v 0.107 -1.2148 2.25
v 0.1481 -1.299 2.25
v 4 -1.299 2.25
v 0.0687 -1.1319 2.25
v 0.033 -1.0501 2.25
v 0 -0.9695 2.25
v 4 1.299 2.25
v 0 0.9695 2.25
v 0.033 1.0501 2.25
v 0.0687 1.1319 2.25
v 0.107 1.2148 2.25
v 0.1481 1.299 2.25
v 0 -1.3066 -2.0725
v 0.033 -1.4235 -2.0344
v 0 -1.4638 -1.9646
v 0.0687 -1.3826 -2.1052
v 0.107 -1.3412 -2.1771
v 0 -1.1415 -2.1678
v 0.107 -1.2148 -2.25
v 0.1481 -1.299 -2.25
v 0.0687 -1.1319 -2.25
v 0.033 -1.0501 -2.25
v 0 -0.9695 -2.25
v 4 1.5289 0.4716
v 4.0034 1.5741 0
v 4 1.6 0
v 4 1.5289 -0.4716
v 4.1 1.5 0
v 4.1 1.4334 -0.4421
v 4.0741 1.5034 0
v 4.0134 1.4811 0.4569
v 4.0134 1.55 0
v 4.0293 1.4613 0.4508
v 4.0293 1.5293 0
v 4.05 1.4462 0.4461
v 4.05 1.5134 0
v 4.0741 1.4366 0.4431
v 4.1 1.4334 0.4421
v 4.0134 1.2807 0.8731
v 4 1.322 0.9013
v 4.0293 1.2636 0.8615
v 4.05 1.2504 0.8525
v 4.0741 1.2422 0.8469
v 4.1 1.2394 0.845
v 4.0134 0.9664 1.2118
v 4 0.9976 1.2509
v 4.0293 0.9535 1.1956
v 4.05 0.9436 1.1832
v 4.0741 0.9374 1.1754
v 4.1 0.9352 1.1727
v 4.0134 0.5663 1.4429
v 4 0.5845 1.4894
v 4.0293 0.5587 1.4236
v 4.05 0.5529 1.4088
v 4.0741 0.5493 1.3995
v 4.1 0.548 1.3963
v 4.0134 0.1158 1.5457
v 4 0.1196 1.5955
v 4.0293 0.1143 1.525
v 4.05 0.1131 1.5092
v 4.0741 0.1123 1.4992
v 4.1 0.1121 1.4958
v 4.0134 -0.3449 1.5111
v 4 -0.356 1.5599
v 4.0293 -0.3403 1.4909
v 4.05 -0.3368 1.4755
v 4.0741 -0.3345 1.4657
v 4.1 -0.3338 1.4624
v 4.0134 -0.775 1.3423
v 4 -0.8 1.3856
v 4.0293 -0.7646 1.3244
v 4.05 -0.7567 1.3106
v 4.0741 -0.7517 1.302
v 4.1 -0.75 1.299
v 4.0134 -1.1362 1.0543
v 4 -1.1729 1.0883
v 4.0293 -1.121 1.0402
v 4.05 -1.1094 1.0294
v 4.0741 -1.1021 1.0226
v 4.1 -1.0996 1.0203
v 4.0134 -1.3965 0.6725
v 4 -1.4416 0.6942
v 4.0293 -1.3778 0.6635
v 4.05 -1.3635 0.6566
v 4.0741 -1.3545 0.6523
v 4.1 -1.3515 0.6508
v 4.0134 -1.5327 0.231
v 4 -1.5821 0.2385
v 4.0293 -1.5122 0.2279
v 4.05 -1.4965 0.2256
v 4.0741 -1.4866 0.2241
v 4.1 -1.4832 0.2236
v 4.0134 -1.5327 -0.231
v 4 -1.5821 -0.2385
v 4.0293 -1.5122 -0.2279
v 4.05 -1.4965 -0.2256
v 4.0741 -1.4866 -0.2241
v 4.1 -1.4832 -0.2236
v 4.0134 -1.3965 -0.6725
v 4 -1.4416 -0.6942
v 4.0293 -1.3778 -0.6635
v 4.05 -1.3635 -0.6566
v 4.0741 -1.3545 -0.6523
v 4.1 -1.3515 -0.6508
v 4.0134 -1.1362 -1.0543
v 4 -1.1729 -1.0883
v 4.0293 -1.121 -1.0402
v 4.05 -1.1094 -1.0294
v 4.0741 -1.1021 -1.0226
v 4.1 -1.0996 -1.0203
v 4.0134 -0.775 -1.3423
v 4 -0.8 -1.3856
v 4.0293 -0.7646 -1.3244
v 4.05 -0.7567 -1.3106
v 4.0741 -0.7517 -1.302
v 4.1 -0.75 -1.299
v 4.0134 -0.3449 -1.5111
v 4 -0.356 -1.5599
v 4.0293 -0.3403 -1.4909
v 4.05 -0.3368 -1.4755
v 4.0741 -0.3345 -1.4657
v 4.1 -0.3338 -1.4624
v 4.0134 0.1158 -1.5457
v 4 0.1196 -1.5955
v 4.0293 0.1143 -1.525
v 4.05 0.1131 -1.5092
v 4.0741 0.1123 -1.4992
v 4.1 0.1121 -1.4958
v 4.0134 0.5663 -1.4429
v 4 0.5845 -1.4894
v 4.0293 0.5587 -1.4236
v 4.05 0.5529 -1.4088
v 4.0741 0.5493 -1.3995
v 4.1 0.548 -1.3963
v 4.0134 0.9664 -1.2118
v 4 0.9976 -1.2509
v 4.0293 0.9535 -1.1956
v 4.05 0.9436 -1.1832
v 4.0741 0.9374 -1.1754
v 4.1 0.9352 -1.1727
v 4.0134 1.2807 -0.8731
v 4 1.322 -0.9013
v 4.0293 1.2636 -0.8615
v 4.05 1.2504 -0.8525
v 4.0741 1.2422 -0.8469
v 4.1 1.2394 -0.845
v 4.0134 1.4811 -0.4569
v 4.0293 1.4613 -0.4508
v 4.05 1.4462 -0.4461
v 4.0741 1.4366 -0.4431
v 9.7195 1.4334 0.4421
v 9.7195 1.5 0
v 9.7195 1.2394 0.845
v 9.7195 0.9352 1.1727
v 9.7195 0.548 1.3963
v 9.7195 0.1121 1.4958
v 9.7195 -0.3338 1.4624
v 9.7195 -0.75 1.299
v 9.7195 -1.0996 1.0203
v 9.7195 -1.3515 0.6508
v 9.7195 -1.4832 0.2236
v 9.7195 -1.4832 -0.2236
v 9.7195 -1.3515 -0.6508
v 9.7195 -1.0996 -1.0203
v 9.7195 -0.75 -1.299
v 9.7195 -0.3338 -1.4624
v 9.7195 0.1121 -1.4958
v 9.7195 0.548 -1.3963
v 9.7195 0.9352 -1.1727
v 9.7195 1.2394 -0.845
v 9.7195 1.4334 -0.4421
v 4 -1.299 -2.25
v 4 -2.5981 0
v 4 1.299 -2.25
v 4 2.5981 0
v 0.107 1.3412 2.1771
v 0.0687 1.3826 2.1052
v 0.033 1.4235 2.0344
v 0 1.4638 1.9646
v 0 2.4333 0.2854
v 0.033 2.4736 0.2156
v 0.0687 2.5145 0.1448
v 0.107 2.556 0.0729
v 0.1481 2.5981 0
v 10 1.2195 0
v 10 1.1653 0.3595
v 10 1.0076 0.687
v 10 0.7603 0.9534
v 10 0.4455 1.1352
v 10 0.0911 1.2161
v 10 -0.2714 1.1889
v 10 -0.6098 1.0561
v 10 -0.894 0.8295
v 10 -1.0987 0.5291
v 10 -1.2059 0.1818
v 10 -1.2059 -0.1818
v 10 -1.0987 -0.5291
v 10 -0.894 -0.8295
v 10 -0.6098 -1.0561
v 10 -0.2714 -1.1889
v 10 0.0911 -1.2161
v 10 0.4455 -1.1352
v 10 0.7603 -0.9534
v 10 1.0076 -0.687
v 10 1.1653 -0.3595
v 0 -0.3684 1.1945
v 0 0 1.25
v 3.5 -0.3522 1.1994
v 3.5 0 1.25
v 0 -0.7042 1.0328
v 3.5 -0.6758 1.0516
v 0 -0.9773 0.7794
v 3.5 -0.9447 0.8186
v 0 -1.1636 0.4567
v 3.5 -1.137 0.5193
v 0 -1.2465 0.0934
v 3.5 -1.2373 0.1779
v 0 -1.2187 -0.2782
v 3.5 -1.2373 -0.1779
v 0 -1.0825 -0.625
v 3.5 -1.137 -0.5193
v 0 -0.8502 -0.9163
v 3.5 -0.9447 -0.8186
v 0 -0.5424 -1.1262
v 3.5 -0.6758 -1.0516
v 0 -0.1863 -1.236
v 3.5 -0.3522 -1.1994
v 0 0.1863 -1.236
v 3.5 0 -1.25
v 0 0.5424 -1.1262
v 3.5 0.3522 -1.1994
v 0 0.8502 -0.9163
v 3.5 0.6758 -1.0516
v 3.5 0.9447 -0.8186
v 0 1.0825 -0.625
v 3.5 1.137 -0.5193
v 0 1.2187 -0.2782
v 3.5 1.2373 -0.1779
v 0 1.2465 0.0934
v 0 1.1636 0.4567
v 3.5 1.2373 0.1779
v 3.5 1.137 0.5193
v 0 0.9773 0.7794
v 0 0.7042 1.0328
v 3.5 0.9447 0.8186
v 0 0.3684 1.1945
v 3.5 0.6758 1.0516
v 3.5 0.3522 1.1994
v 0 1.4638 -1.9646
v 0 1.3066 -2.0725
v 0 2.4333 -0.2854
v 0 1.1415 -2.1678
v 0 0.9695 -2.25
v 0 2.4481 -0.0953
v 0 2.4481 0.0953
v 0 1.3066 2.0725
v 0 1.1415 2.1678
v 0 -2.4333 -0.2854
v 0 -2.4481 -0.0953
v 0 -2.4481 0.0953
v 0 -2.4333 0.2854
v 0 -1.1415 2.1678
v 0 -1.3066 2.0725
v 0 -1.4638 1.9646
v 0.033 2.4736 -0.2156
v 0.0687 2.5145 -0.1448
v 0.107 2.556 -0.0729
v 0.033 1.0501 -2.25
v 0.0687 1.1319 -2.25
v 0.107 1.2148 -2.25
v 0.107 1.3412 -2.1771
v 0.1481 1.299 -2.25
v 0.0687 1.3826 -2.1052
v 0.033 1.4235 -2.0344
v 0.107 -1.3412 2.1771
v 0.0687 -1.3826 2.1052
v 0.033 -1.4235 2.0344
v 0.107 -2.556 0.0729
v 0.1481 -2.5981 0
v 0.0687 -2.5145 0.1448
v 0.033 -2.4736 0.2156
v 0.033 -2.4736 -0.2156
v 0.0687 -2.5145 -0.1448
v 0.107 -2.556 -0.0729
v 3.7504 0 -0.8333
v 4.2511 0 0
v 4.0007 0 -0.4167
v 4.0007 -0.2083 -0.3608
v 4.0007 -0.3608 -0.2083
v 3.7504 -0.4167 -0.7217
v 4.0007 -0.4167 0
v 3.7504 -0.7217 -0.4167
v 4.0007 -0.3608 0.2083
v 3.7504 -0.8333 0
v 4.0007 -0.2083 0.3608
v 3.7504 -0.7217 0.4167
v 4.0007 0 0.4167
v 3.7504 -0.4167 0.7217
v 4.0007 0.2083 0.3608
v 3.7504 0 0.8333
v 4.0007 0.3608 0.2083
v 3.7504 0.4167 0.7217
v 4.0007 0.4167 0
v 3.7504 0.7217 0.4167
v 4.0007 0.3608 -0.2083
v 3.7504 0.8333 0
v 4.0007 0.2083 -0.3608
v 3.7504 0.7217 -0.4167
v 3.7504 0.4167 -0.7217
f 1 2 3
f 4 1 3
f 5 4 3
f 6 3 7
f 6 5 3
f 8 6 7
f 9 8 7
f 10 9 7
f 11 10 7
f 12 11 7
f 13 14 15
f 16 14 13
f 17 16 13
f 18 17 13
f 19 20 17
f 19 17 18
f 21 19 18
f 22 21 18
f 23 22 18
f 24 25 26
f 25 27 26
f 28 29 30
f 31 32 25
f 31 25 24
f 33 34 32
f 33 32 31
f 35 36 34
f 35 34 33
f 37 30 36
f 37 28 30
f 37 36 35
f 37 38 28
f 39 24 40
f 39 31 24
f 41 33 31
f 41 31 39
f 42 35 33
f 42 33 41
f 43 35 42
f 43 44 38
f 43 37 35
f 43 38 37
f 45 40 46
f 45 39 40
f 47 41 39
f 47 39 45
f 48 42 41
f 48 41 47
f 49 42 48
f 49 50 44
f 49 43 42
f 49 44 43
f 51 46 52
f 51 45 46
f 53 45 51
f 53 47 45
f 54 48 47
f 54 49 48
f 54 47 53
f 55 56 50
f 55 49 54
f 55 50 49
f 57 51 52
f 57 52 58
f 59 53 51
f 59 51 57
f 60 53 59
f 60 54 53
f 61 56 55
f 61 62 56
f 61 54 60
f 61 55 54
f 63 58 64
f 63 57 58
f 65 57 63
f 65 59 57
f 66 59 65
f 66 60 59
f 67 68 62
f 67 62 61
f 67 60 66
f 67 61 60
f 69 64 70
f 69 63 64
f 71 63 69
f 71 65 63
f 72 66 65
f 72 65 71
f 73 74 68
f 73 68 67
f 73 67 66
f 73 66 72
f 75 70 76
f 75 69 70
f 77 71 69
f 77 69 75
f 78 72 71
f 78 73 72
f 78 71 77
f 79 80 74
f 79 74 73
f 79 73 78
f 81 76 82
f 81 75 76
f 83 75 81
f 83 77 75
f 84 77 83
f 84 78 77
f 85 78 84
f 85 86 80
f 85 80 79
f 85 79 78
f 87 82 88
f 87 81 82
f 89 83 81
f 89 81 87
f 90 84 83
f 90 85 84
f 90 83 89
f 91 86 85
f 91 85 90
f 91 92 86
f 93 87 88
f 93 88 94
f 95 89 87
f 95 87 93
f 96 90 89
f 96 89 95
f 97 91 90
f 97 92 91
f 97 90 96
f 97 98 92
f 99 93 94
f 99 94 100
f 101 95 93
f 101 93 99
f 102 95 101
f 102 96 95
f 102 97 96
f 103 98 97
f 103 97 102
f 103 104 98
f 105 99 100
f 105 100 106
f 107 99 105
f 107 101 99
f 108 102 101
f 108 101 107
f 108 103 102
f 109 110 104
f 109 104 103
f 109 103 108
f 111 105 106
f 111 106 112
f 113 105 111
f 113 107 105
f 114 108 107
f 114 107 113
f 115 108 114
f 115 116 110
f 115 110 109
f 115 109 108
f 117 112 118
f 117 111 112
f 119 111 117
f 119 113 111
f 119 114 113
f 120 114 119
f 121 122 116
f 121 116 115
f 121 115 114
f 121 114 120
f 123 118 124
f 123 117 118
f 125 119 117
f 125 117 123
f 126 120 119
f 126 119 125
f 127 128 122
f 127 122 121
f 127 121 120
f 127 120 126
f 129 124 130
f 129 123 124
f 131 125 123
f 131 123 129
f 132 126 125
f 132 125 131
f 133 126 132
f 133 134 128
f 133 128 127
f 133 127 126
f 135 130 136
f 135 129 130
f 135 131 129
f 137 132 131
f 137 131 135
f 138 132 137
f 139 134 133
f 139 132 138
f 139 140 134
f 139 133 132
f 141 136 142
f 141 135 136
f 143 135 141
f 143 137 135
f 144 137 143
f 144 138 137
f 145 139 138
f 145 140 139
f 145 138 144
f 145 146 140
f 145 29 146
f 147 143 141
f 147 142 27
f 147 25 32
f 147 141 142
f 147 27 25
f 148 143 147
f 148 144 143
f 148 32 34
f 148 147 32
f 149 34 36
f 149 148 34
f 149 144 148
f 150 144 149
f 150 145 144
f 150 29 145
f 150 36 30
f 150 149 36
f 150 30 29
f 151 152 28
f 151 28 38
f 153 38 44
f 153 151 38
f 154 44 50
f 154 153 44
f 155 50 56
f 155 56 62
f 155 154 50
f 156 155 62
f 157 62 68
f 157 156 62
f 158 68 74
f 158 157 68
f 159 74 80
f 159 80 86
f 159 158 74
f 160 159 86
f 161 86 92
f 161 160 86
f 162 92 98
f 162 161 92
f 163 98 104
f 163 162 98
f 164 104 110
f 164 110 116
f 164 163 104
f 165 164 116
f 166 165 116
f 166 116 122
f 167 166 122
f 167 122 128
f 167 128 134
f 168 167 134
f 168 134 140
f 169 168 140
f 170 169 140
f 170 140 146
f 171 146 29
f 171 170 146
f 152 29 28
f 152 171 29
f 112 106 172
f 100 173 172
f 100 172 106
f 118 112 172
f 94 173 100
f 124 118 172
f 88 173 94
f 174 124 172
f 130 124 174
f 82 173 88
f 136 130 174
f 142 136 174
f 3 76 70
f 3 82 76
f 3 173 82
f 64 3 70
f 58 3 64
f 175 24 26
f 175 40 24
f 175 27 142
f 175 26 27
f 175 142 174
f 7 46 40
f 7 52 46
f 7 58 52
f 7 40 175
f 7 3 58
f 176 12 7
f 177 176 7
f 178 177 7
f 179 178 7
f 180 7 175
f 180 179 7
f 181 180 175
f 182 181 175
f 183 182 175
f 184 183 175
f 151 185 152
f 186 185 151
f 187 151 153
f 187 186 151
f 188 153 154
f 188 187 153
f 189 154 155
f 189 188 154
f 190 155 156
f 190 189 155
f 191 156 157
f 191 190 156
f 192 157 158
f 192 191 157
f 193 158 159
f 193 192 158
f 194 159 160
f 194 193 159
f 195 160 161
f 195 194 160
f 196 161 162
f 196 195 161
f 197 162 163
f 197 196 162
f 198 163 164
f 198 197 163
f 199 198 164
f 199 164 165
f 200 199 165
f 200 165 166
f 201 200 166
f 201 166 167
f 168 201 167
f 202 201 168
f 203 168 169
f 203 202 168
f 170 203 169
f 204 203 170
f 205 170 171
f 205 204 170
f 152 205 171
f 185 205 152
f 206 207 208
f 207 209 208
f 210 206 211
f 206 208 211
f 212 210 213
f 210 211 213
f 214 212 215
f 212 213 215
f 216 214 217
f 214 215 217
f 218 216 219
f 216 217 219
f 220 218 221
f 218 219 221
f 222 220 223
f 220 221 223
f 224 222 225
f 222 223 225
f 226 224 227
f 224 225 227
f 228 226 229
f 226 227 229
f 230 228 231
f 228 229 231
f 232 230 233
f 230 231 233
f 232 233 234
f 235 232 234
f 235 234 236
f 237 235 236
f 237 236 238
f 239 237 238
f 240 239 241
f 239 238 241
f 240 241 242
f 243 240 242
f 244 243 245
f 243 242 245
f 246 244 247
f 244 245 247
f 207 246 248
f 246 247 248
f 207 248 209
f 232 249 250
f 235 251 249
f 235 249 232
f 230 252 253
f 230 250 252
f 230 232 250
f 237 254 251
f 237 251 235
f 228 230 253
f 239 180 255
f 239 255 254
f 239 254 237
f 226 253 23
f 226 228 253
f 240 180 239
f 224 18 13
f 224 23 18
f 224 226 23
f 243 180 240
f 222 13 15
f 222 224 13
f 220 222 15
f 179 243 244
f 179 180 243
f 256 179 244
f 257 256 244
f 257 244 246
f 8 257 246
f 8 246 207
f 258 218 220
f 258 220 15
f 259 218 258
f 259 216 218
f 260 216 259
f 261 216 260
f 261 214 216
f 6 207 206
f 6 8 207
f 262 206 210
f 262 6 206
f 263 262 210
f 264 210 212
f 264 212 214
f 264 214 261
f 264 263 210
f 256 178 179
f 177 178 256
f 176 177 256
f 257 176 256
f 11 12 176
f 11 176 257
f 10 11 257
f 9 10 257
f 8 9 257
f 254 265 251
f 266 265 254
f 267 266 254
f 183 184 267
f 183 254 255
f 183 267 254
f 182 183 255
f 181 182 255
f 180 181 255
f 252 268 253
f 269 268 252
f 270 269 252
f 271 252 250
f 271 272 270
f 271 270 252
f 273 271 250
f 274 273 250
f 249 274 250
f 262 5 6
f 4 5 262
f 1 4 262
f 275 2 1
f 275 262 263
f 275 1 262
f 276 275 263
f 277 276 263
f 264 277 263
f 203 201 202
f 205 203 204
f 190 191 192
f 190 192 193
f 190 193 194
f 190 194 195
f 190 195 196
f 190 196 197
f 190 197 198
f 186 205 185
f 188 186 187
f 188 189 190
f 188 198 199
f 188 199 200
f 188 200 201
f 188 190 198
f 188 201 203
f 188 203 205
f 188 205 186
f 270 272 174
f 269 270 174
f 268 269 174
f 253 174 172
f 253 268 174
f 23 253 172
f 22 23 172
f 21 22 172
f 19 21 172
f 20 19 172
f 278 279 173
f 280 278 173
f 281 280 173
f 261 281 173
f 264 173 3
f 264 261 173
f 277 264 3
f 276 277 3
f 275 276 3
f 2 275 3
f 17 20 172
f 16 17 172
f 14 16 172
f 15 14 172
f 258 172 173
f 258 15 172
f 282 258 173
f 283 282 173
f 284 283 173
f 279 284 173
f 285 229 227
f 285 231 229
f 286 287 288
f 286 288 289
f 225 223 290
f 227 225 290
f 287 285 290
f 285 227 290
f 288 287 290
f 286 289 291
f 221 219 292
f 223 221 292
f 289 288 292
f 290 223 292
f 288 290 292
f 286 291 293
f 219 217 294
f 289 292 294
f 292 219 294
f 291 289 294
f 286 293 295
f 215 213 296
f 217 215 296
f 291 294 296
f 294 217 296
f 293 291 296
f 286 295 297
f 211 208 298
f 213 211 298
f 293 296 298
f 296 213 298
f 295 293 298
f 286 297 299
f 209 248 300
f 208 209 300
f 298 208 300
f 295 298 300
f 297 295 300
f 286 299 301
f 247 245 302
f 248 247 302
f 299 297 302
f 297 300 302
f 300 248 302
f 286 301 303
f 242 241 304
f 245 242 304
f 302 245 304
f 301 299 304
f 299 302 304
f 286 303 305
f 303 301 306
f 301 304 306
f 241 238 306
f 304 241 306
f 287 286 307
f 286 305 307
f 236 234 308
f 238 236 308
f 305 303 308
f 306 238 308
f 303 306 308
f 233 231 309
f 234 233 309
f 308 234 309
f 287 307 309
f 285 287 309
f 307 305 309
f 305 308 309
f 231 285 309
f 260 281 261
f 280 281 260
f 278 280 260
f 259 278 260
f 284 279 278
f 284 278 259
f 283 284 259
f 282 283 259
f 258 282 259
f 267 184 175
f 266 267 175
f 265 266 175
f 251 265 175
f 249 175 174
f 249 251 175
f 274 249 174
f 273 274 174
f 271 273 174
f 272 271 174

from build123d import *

# Parameters (mm, degrees)
FILLET1_R                 = 0.1
SKETCH3_OUTSIDE_W         = 12.048
SKETCH3_OUTSIDE_H         = 12.048
HEX_2_DEPTH               = 11
M3X0_5_TAPPED_HOLE1_D     = 2.5
M3X0_5_TAPPED_HOLE1_DEPTH = 3.5
M3X0_5_TAPPED_HOLE1_TIP   = 0.751075774


with BuildPart() as part:
    # BodySke → Base-Revolve (revolve)
    with BuildSketch(Plane.XY):
        Polygon((0, 0), (0, 2.45), (0.3, 2.75), (4, 2.75), (4, 1.5), (9.7195, 1.5), (10, 1.2195), (10, 0), align=None)
    revolve(axis=Axis((-31.75, 0, 0), (1, 0, 0)))

    # Fillet1
    fillet1_edges = [part.edges().sort_by_distance(p)[0] for p in [
        (4, -1.5, 0),
    ]]
    fillet(fillet1_edges, radius=FILLET1_R)

    # Sketch3 outside → Hex 2 (cut, through all)
    with BuildSketch(Plane(origin=(0, 0, 0), x_dir=(0, 0.5, 0.866025404), z_dir=(-1, 0, 0))):
        Rectangle(SKETCH3_OUTSIDE_W, SKETCH3_OUTSIDE_H)
        Polygon((1.299038106, 2.25), (-1.299038106, 2.25), (-2.598076211, 0), (-1.299038106, -2.25), (1.299038106, -2.25), (2.598076211, 0), align=None, mode=Mode.SUBTRACT)
    extrude(amount=-HEX_2_DEPTH, mode=Mode.SUBTRACT)

    # M3x0.5 Tapped Hole1
    with Locations(Plane(origin=(0, 0, 0), x_dir=(0, 0, -1), z_dir=(-1, 0, 0))):
        with Locations((0, 0)):
            Hole(M3X0_5_TAPPED_HOLE1_D / 2, depth=M3X0_5_TAPPED_HOLE1_DEPTH)
            with Locations((0, 0, -(M3X0_5_TAPPED_HOLE1_DEPTH + M3X0_5_TAPPED_HOLE1_TIP / 2))):  # 118° drill point
                Cone(0, M3X0_5_TAPPED_HOLE1_D / 2, M3X0_5_TAPPED_HOLE1_TIP, mode=Mode.SUBTRACT)


solid = part.part
